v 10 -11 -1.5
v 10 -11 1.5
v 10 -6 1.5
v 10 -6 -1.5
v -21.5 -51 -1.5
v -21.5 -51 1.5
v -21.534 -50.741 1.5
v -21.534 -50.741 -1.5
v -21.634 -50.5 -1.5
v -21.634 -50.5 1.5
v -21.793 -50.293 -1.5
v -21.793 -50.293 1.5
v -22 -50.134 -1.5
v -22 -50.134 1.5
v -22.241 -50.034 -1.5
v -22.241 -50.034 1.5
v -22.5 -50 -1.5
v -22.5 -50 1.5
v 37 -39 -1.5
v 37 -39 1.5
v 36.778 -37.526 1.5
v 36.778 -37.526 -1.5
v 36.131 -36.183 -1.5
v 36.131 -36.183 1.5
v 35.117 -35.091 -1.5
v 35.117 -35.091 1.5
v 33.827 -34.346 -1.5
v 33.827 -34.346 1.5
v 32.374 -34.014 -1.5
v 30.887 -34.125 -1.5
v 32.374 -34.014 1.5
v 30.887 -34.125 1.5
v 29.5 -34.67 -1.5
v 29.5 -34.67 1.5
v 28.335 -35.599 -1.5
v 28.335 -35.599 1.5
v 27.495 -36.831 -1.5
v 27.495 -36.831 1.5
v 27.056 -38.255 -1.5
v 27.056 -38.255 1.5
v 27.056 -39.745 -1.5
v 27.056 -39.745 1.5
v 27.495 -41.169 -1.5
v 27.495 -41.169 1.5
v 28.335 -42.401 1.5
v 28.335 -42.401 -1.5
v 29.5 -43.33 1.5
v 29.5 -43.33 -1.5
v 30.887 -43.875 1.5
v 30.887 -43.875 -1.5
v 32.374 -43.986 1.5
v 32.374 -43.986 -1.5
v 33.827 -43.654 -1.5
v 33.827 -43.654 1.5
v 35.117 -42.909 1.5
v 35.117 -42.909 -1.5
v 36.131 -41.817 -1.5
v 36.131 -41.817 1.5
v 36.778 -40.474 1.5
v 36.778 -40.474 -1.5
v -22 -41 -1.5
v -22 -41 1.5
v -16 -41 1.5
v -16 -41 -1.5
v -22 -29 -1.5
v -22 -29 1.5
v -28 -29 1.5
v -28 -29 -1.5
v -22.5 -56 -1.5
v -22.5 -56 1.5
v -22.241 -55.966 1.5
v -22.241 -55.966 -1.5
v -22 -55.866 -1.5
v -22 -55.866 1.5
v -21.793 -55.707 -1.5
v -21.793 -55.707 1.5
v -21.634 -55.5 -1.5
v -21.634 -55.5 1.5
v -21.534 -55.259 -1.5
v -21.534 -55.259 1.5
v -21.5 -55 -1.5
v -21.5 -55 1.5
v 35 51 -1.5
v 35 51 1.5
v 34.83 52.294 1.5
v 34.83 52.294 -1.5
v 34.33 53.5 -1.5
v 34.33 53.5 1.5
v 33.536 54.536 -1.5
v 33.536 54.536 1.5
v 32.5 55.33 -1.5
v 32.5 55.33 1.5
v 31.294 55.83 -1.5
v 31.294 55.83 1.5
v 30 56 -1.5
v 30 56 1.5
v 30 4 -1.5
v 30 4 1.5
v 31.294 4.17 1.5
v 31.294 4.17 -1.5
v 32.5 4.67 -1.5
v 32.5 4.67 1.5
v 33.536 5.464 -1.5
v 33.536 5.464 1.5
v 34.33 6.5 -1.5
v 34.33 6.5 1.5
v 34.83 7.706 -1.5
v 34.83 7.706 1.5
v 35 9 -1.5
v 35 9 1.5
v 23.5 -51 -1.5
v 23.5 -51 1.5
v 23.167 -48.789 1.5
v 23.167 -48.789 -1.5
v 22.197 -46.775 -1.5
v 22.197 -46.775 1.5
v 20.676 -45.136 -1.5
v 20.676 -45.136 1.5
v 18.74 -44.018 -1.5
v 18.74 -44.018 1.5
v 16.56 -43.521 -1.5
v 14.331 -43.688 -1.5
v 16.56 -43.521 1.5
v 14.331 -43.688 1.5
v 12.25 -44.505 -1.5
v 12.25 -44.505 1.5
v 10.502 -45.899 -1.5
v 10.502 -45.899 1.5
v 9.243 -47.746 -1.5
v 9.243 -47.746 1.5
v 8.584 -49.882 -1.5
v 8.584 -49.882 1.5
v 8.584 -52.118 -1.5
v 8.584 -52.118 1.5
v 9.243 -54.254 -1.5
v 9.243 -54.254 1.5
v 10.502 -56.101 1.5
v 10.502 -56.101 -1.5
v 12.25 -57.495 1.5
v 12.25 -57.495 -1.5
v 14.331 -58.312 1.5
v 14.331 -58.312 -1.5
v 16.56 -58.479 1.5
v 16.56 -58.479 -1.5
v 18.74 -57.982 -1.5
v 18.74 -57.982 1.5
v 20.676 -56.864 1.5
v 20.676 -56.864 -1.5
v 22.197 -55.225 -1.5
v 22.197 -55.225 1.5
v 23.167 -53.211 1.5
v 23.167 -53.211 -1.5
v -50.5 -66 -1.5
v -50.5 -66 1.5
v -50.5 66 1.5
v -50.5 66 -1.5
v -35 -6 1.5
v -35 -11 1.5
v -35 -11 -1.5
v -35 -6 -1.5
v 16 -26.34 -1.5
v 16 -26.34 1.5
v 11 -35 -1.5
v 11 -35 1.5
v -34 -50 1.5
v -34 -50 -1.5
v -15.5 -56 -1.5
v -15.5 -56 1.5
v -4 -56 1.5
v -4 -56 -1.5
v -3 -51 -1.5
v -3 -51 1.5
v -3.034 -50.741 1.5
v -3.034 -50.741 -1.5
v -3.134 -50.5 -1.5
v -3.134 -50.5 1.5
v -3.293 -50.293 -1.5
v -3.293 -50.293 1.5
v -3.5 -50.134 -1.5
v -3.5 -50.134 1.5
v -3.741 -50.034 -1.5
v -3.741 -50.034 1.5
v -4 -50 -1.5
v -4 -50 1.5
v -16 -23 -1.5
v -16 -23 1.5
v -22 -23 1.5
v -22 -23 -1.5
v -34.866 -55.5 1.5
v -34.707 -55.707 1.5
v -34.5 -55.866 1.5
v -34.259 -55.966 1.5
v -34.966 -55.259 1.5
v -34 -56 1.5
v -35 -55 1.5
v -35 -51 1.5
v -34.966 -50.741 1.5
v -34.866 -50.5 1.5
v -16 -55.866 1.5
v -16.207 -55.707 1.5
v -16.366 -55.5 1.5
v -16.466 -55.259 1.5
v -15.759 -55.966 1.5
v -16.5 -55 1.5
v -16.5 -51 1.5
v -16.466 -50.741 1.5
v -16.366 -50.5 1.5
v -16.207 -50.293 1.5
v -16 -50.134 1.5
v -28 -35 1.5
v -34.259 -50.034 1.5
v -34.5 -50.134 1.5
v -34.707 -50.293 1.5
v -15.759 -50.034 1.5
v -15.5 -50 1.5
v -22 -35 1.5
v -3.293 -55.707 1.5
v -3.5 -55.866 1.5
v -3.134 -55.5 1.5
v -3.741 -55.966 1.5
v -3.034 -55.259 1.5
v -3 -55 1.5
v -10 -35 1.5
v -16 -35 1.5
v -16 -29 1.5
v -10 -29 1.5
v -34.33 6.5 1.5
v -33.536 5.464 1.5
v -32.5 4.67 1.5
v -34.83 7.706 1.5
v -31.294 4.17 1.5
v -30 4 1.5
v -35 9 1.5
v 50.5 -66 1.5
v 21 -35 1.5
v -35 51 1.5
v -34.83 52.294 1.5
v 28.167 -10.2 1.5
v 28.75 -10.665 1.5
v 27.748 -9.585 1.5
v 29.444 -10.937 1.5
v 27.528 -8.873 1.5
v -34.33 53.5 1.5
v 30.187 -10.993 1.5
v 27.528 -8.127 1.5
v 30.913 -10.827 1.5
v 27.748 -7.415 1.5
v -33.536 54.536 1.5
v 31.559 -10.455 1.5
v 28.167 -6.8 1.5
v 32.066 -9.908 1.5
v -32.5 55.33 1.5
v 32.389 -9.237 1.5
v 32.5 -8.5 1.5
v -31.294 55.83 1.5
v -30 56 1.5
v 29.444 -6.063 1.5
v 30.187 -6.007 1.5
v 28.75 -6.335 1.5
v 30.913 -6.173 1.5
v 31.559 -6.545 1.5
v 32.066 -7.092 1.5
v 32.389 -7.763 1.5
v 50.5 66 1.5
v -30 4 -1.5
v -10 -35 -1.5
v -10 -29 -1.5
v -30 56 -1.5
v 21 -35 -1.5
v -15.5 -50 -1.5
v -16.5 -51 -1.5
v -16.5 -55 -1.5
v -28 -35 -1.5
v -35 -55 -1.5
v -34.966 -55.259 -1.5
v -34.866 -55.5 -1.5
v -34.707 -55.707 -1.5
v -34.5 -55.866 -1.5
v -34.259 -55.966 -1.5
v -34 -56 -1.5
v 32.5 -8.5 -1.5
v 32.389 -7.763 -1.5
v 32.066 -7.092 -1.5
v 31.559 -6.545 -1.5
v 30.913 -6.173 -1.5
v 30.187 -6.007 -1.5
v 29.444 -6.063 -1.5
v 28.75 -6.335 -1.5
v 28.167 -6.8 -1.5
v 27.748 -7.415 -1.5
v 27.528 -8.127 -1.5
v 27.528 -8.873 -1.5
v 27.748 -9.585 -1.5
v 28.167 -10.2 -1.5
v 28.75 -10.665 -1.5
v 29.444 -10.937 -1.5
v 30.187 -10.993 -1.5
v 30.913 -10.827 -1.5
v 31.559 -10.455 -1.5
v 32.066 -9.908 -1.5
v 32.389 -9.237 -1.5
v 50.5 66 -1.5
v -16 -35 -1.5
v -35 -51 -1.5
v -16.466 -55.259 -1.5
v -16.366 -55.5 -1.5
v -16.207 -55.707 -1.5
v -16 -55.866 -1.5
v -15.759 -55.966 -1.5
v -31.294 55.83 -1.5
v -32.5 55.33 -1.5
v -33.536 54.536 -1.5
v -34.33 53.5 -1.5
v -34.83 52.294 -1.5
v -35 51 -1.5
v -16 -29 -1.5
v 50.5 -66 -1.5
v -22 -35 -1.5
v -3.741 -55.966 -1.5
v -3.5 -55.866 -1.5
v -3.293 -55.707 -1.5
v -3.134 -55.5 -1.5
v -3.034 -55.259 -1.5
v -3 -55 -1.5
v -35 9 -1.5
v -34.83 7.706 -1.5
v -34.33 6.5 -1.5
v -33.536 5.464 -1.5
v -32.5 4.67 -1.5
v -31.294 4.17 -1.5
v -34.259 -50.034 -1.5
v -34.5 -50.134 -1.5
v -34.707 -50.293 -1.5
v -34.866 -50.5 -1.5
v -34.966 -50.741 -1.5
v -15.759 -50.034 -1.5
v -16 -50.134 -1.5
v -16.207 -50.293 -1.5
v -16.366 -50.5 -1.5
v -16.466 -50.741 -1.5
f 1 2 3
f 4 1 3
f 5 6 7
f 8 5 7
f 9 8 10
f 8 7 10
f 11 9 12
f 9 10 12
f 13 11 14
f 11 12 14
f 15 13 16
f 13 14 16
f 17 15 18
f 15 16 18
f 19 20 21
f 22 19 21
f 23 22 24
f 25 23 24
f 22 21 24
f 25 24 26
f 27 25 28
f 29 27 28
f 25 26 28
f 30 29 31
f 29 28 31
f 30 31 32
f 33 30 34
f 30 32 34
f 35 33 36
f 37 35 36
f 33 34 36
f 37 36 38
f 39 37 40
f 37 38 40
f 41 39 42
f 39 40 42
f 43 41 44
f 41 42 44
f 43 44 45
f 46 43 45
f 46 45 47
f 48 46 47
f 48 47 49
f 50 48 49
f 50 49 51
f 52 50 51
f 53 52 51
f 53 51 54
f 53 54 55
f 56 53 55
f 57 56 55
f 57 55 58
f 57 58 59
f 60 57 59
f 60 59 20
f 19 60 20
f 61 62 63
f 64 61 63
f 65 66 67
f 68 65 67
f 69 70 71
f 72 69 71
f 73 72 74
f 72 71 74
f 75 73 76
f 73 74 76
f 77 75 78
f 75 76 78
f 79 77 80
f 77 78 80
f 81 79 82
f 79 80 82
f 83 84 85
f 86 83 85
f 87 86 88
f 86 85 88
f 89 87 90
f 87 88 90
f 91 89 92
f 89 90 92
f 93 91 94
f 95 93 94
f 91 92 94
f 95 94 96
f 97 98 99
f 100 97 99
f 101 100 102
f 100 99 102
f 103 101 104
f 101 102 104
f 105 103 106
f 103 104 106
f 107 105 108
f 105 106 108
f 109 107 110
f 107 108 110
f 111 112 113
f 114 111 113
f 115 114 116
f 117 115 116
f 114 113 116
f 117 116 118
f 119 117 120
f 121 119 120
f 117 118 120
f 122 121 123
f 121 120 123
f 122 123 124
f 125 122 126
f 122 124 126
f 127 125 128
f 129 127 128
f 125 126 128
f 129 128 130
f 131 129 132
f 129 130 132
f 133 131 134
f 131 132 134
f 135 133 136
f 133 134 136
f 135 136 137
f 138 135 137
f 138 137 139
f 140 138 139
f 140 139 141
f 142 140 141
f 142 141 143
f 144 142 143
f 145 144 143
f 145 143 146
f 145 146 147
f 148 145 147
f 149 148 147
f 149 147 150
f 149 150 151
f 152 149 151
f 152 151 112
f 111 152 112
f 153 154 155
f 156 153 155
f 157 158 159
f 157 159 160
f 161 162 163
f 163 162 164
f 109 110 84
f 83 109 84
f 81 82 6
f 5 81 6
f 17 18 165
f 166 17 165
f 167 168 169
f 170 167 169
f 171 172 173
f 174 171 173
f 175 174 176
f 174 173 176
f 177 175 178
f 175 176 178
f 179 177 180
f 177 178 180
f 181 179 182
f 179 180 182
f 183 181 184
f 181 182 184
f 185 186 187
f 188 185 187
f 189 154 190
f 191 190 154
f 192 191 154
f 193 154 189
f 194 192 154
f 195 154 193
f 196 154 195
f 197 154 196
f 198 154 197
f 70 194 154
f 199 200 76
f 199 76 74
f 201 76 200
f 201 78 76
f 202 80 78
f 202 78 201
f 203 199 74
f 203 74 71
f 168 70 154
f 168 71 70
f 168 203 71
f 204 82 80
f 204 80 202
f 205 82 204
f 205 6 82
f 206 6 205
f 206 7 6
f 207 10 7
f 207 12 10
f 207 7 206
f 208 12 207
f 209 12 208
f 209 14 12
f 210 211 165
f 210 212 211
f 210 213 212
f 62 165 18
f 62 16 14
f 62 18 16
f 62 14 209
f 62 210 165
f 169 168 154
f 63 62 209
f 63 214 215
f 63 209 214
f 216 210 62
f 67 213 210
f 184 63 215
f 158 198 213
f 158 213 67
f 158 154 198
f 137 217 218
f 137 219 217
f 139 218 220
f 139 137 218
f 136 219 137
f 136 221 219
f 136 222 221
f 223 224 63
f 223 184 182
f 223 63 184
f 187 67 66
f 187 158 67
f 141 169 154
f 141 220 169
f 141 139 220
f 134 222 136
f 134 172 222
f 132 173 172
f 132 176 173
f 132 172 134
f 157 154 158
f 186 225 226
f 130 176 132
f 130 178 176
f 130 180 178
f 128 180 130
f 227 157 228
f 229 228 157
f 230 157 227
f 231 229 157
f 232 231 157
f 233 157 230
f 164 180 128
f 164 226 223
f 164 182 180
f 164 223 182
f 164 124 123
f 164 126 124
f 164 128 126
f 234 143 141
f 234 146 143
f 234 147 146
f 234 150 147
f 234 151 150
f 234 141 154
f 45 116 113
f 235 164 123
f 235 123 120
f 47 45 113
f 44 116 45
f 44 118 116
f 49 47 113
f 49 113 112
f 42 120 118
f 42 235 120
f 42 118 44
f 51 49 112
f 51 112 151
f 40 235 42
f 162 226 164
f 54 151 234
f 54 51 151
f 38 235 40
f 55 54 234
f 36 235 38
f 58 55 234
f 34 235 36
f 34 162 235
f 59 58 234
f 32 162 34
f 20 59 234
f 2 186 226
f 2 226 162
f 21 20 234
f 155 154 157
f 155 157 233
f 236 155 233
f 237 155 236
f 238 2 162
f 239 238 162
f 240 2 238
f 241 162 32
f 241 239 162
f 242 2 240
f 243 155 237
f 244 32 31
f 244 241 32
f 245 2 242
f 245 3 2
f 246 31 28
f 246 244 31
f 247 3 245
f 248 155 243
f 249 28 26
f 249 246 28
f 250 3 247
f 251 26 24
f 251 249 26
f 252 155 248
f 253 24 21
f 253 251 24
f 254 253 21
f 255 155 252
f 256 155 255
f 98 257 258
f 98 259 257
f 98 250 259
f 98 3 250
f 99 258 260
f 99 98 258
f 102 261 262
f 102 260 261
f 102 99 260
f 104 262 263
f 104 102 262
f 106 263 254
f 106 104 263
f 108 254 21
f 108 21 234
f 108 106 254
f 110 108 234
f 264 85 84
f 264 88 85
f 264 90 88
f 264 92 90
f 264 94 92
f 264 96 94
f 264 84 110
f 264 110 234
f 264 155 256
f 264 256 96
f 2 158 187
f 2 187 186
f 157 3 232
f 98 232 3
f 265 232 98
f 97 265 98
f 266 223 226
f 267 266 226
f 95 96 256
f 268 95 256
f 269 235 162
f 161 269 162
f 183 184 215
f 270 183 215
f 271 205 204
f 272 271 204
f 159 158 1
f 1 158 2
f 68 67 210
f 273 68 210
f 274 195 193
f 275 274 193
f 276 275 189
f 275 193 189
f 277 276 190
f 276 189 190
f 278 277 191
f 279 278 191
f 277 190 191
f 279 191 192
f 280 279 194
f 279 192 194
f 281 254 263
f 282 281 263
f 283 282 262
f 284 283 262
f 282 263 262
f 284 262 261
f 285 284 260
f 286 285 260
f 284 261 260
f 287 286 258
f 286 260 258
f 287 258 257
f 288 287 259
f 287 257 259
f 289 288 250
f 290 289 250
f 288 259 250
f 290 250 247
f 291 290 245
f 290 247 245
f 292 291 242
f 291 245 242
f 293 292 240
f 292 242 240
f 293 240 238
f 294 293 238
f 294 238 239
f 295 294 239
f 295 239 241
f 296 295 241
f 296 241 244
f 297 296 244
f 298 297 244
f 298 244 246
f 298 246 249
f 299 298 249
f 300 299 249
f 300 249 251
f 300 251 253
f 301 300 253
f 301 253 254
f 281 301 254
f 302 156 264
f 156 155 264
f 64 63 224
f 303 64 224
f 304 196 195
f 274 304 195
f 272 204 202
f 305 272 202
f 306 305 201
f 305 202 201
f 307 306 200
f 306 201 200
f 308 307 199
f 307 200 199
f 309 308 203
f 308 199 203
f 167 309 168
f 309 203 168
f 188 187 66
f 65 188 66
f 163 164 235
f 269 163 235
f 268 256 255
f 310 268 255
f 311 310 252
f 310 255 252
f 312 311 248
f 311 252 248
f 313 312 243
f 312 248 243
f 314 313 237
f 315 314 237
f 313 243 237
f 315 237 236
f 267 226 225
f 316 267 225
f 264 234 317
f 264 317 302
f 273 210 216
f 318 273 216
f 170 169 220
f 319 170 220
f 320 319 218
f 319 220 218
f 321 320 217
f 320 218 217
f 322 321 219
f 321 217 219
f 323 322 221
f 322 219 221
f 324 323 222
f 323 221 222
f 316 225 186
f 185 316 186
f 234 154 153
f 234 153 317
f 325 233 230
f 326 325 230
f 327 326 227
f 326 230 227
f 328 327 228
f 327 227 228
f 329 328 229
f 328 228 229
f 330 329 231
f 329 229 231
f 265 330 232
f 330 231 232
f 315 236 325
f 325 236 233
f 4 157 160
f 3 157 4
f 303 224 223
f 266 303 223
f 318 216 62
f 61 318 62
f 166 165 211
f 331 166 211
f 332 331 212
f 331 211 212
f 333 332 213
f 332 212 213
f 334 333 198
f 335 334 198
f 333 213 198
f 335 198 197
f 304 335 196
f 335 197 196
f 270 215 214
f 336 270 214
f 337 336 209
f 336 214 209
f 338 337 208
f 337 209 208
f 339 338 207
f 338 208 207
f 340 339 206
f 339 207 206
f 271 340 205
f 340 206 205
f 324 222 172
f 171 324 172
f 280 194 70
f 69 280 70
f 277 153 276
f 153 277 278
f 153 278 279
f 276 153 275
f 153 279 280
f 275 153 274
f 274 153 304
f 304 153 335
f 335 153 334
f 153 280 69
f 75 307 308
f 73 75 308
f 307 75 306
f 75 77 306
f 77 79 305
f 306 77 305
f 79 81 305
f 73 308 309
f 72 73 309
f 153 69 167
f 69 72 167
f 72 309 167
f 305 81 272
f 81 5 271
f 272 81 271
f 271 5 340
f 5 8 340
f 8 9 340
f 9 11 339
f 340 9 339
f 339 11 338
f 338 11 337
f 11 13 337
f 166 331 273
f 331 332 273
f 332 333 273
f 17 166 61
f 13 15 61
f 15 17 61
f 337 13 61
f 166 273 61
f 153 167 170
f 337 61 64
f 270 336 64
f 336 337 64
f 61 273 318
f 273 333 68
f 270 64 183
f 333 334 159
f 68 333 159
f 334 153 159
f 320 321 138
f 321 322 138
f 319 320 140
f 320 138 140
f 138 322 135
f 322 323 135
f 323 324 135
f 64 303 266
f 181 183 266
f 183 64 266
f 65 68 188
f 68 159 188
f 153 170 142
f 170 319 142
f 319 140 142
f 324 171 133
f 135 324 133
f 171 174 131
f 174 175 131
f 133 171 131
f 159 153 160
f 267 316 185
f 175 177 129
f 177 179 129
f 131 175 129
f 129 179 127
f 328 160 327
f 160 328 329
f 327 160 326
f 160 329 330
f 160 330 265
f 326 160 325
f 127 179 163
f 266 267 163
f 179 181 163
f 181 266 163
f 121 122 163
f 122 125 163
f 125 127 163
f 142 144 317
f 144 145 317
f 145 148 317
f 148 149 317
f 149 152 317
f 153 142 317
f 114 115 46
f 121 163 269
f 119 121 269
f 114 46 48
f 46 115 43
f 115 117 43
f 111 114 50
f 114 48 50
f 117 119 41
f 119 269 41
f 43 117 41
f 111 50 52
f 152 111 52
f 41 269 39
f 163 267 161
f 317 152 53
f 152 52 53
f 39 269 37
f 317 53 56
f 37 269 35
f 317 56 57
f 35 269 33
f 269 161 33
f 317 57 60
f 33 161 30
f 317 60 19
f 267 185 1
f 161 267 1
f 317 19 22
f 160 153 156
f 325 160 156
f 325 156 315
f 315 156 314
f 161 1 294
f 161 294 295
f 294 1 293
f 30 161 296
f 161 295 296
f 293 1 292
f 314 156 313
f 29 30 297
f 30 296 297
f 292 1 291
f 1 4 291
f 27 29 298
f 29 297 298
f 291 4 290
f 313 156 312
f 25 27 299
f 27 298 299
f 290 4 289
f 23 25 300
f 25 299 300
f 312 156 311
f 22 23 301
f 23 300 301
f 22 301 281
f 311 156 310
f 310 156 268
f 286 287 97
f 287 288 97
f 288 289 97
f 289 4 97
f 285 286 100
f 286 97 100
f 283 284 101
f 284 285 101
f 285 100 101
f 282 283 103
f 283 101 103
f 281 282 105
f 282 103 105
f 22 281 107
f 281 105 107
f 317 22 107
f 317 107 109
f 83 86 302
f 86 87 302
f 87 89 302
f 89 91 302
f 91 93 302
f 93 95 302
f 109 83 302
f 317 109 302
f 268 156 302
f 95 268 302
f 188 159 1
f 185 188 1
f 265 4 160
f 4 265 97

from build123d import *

# Parameters (mm, degrees)
SKETCH1_W           = 101
SKETCH1_H           = 132
BOSS_EXTRUDE1_DEPTH = 1.5
SKETCH2_R           = 7.5
SKETCH2_R_2         = 5
SKETCH2_R_3         = 2.5
SKETCH2_W           = 45
SKETCH2_H           = 5
CUT_EXTRUDE2_DEPTH  = 84.157982179


with BuildPart() as part:
    # Sketch1 → Boss-Extrude1 (new, symmetric)
    with BuildSketch(Plane.XY):
        Rectangle(SKETCH1_W, SKETCH1_H)
    extrude(amount=BOSS_EXTRUDE1_DEPTH, both=True)

    # Sketch2 → Cut-Extrude2 (cut, through all)
    with BuildSketch(Plane.XY.offset(1.5)):
        with Locations((16, -51)):
            Circle(SKETCH2_R)
        with Locations((32, -39)):
            Circle(SKETCH2_R_2)
        with Locations((30, -8.5)):
            Circle(SKETCH2_R_3)
        with BuildLine():
            Line((-30, 4), (30, 4))
            ThreePointArc((30, 4), (33.535533906, 5.464466094), (35, 9))
            Line((35, 9), (35, 51))
            ThreePointArc((35, 51), (33.535533906, 54.535533906), (30, 56))
            Line((30, 56), (-30, 56))
            ThreePointArc((-30, 56), (-33.535533906, 54.535533906), (-35, 51))
            Line((-35, 51), (-35, 9))
            ThreePointArc((-35, 9), (-33.535533906, 5.464466094), (-30, 4))
        make_face()
        Polygon((11, -35), (21, -35), (16, -26.339745962), align=None)
        with BuildLine():
            Line((-15.5, -56), (-4, -56))
            ThreePointArc((-4, -56), (-3.292893219, -55.707106781), (-3, -55))
            Line((-3, -55), (-3, -51))
            ThreePointArc((-3, -51), (-3.292893219, -50.292893219), (-4, -50))
            Line((-4, -50), (-15.5, -50))
            ThreePointArc((-15.5, -50), (-16.207106781, -50.292893219), (-16.5, -51))
            Line((-16.5, -51), (-16.5, -55))
            ThreePointArc((-16.5, -55), (-16.207106781, -55.707106781), (-15.5, -56))
        make_face()
        with BuildLine():
            Line((-34, -56), (-22.5, -56))
            ThreePointArc((-22.5, -56), (-21.792893219, -55.707106781), (-21.5, -55))
            Line((-21.5, -55), (-21.5, -51))
            ThreePointArc((-21.5, -51), (-21.792893219, -50.292893219), (-22.5, -50))
            Line((-22.5, -50), (-34, -50))
            ThreePointArc((-34, -50), (-34.707106781, -50.292893219), (-35, -51))
            Line((-35, -51), (-35, -55))
            ThreePointArc((-35, -55), (-34.707106781, -55.707106781), (-34, -56))
        make_face()
        Polygon((-22, -41), (-16, -41), (-16, -35), (-10, -35), (-10, -29), (-16, -29), (-16, -23), (-22, -23), (-22, -29), (-28, -29), (-28, -35), (-22, -35), align=None)
        with Locations((-12.5, -8.5)):
            Rectangle(SKETCH2_W, SKETCH2_H)
    extrude(amount=-CUT_EXTRUDE2_DEPTH, mode=Mode.SUBTRACT)


solid = part.part
